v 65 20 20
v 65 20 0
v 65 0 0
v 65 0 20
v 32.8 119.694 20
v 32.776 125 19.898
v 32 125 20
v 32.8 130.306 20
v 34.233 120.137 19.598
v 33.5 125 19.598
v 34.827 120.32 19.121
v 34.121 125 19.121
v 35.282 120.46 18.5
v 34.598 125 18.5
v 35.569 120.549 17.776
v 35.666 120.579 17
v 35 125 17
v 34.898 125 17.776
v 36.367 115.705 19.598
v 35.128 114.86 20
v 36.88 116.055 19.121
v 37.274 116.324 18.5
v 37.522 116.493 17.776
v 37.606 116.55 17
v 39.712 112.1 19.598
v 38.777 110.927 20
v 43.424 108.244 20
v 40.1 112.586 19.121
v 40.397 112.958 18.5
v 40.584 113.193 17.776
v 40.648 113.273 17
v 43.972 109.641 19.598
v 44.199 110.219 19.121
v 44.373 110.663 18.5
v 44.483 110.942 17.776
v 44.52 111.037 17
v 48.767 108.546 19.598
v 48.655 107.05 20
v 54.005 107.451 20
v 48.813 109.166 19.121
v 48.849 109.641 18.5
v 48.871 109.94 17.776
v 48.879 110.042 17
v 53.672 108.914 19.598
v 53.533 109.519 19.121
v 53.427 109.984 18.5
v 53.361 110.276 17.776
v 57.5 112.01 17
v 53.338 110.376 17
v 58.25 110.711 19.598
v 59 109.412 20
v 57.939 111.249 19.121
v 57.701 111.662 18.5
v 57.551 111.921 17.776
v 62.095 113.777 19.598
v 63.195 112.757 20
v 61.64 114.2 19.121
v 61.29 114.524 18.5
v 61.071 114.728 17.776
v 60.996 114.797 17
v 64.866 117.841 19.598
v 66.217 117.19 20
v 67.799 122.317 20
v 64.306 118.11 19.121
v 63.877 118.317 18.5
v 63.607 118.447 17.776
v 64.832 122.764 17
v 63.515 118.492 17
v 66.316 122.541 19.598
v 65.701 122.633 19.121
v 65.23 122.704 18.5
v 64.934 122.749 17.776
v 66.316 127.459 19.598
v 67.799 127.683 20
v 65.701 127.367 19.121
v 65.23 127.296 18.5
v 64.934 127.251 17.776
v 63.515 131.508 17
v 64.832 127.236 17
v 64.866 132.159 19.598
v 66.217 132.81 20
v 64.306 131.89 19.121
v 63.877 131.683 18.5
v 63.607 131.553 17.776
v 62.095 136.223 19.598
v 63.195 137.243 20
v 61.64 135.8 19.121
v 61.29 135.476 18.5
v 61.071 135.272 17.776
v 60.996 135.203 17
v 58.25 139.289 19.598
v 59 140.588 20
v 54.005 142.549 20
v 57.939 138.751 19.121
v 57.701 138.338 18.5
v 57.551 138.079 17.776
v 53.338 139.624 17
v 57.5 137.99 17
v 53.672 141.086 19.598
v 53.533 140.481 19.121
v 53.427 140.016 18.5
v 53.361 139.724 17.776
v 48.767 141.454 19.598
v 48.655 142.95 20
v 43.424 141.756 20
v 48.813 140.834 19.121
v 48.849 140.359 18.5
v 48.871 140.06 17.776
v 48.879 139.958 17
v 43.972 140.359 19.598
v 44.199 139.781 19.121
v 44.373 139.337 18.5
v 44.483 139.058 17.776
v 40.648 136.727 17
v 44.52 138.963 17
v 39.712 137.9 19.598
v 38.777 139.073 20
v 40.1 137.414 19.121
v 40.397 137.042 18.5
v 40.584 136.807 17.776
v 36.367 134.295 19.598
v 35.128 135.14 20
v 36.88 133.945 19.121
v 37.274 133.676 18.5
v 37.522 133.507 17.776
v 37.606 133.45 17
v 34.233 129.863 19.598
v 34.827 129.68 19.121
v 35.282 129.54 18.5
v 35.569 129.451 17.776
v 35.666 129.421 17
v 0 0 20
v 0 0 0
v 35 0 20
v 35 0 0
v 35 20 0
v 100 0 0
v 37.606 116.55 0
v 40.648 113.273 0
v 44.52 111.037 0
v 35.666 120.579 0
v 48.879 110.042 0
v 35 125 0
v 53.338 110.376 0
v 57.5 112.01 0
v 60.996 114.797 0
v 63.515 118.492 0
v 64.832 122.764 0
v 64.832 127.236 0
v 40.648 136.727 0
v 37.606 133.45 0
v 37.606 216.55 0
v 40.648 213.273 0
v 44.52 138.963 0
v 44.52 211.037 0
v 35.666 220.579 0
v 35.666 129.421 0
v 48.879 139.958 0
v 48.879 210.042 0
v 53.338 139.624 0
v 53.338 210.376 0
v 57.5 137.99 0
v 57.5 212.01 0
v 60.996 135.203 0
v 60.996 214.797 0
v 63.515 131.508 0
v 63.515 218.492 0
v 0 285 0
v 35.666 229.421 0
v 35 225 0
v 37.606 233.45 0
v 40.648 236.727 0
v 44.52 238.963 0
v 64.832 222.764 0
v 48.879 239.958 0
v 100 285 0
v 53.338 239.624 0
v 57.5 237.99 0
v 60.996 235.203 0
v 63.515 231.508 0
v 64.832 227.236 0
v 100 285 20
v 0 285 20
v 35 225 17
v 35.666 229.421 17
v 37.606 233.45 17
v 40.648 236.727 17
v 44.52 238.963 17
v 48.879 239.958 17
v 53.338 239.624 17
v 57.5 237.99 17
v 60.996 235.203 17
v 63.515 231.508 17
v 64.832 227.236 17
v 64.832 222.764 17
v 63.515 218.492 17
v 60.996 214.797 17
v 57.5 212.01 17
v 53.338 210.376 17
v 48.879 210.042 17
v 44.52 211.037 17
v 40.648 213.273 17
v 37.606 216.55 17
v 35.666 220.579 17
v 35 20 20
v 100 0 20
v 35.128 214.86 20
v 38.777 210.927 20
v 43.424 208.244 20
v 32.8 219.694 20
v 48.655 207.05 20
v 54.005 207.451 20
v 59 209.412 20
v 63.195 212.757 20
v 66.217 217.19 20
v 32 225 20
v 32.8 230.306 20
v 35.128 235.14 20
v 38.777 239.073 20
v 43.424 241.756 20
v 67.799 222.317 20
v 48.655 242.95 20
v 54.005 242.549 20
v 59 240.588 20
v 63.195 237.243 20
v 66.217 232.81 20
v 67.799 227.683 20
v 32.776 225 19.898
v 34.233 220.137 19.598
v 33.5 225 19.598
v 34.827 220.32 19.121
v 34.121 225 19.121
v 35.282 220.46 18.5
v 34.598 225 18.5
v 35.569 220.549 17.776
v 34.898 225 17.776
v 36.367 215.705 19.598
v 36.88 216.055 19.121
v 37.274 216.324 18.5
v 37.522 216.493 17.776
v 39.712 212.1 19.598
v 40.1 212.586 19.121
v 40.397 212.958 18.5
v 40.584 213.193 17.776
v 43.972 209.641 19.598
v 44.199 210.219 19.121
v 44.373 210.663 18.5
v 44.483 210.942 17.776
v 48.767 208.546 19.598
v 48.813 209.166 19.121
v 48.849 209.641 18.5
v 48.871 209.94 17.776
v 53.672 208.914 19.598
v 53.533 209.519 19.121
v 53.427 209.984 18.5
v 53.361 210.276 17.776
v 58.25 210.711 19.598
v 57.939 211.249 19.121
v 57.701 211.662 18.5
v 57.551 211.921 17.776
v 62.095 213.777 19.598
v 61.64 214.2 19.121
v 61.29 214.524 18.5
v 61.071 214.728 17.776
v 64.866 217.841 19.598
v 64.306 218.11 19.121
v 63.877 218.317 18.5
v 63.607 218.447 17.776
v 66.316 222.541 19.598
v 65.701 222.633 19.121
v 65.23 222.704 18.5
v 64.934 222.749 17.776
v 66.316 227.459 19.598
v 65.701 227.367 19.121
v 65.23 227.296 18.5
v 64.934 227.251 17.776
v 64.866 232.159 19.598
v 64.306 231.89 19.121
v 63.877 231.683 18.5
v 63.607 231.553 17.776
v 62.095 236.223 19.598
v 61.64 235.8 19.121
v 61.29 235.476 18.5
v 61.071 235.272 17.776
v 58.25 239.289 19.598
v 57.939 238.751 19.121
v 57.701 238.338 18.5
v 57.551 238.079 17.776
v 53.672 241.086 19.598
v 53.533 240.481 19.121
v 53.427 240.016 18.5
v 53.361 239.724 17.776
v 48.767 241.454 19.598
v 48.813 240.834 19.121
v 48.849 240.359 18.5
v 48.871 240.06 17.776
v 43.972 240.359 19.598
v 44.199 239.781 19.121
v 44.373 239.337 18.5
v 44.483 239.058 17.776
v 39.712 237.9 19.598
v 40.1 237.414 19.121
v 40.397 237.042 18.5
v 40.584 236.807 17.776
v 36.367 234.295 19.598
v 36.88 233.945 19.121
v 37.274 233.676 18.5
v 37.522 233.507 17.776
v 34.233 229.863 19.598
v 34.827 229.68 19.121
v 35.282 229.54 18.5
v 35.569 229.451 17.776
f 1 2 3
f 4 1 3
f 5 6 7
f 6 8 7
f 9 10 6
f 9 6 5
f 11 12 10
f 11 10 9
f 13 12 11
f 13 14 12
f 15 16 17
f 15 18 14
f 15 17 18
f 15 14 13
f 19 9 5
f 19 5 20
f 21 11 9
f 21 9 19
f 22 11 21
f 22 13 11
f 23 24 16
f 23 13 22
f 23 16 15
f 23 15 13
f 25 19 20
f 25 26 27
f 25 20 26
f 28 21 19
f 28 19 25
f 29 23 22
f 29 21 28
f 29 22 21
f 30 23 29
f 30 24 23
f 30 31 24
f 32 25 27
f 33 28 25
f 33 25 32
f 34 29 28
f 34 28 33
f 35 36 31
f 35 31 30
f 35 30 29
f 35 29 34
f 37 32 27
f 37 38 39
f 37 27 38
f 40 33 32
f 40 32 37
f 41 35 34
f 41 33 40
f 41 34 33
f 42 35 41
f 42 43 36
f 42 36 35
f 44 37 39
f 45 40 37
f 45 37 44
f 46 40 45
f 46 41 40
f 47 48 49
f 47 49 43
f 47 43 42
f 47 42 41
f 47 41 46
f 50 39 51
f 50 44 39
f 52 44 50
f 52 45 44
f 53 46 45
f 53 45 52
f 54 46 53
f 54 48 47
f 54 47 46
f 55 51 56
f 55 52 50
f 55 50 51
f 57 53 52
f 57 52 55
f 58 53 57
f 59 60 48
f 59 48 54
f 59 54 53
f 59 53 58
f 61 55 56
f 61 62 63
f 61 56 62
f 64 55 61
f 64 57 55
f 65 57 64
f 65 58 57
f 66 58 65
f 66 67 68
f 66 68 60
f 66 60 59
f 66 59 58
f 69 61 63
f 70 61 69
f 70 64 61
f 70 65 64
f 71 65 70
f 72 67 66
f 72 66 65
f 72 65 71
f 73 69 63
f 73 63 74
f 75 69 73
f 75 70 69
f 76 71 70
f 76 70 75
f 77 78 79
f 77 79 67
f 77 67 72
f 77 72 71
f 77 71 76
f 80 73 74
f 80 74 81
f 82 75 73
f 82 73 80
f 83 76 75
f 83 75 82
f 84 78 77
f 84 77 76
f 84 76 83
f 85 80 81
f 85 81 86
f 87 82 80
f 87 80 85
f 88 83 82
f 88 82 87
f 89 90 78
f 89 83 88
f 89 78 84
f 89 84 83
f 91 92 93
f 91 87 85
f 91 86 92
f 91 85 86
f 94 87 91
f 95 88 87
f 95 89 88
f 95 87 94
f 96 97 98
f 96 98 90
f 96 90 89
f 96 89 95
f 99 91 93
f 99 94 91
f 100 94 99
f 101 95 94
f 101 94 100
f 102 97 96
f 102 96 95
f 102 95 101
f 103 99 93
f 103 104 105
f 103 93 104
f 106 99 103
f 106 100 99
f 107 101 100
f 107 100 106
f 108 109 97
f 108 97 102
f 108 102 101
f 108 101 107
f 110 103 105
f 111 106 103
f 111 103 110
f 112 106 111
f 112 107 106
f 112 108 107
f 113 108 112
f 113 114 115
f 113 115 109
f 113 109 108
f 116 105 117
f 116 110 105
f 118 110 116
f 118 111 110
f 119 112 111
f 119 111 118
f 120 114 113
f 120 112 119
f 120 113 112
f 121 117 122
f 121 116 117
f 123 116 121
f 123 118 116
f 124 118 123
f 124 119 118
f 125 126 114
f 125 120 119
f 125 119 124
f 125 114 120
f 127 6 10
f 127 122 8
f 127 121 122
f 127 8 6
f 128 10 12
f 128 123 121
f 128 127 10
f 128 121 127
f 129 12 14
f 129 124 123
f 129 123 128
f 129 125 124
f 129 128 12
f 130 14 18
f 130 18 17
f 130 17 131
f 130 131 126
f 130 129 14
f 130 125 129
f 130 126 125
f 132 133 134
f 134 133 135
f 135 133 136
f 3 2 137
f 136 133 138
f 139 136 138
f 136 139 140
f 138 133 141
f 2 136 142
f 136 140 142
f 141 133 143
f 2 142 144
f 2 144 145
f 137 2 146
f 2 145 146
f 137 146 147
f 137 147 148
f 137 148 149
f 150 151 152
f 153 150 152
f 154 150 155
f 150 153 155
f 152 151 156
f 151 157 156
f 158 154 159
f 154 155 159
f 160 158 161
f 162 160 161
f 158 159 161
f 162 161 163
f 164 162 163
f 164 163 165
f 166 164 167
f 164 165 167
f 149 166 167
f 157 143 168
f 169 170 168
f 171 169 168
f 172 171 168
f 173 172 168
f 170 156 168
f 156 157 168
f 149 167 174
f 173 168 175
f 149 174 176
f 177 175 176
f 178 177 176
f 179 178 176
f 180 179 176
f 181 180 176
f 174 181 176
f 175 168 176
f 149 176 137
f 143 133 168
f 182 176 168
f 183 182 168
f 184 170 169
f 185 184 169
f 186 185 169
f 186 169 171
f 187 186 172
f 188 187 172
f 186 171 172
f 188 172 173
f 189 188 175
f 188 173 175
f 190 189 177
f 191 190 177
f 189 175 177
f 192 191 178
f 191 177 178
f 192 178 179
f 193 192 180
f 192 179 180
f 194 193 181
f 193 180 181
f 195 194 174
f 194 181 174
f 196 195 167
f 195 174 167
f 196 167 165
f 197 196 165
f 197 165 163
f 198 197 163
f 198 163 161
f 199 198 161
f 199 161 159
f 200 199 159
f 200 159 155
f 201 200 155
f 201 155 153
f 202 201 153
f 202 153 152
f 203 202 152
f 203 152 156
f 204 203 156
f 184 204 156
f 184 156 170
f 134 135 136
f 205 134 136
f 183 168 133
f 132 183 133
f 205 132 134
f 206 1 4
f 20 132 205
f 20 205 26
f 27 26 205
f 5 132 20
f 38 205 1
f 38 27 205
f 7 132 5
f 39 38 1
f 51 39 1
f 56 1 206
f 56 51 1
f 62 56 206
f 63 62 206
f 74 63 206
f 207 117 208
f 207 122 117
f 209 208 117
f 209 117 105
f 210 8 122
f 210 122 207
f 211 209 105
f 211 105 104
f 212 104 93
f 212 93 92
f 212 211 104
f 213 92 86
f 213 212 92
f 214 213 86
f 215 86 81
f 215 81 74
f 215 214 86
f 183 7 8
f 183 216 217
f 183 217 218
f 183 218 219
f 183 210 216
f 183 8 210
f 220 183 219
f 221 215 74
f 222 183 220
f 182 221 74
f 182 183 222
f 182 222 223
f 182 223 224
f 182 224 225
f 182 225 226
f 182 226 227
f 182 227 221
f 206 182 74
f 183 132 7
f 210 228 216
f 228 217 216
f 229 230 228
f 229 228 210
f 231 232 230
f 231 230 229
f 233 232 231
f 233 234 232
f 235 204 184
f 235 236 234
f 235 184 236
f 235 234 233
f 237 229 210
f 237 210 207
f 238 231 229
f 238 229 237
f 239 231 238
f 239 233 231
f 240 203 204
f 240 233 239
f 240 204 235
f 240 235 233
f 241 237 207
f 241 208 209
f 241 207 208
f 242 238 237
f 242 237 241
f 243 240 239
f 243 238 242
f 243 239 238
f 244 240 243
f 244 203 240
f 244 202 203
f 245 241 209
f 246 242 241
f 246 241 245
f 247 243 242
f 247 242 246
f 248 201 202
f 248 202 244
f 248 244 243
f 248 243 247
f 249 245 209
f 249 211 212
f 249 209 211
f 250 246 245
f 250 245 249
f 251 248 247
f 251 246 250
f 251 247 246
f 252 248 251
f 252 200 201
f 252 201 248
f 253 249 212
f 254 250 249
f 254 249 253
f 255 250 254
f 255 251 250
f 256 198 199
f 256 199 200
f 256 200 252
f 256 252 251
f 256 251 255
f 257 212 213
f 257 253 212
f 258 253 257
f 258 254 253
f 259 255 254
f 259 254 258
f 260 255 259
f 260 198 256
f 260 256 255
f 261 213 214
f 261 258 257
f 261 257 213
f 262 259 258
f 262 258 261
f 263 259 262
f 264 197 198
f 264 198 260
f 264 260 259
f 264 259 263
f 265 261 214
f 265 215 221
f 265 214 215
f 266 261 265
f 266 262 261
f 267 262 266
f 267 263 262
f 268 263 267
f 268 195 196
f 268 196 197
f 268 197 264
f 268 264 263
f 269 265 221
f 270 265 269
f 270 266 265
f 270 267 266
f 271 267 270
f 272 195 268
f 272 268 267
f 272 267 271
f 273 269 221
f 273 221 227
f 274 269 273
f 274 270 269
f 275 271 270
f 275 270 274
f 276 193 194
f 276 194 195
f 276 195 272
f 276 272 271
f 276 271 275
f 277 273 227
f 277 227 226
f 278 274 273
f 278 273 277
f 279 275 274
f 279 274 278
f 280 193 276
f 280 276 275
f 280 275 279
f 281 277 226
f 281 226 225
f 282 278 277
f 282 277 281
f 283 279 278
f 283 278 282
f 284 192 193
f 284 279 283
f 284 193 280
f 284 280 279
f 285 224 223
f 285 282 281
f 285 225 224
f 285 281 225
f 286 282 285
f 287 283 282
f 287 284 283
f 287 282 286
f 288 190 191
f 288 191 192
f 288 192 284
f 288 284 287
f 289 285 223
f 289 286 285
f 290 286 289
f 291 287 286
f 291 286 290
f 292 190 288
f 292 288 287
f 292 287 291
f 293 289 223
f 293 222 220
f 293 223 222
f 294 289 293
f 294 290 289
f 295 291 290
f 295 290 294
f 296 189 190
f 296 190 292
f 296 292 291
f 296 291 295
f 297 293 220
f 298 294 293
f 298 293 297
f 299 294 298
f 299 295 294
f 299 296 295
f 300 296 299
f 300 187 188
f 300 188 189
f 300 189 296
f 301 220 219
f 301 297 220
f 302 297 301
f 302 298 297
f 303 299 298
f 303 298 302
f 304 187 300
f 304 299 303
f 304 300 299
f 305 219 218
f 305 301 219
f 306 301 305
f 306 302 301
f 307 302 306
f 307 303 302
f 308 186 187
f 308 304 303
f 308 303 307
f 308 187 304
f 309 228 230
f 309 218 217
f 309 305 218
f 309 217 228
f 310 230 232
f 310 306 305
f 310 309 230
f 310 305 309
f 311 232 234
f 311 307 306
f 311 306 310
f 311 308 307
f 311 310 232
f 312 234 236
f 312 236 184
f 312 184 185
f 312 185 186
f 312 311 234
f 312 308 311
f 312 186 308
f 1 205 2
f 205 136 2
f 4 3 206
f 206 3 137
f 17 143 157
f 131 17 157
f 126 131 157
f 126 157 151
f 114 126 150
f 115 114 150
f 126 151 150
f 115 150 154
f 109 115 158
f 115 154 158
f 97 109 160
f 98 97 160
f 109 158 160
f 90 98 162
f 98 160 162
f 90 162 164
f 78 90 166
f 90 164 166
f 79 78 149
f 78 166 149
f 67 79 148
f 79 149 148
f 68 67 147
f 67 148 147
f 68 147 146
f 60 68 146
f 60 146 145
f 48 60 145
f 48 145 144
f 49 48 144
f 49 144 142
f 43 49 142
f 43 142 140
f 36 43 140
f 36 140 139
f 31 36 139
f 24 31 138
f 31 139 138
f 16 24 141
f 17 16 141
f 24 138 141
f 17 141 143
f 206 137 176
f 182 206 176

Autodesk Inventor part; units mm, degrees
ref_plane "YZ Plane" through (0, 0, 0) normal (1, 0, 0) x (0, 1, 0)
ref_plane "XZ Plane" through (0, 0, 0) normal (0, 1, 0) x (-1, 0, 0)
ref_plane "XY Plane" through (0, 0, 0) normal (0, 0, 1) x (1, 0, 0)
sketch "Sketch1" plane through (0, 0, 0) normal (0, 0, 1) x (1, 0, 0)
  line L0 (0, 0) -> (100, 0)
  line L1 (100, 0) -> (100, 285)
  line L2 (100, 285) -> (0, 285)
  line L3 (0, 285) -> (0, 0)
  dimension "d0" = 100
  dimension "d1" = 285
extrude "Extrusion1" add sketch "Sketch1" along normal blind 20
sketch "Sketch2" plane through (0, 0, 0) normal (0, 0, -1) x (-1, 0, 0)
  circle A0 centre (-50, 125) radius 15
  circle A1 centre (-50, 225) radius 15
  line L0 (0, 285) -> (0, 0) projected
  line L1 (0, 0) -> (-100, 0) projected
  line L2 (-100, 285) -> (0, 285) projected
  dimension "d5" = 30
  dimension "d6" = 50
  dimension "d7" = 50
  dimension "d9" = 100
  dimension "d17" = 60
extrude "Extrusion2" cut sketch "Sketch2" against normal up to next
sketch "Sketch3" plane through (0, 0, 0) normal (0, 0, -1) x (-1, 0, 0)
  line L0 (0, 0) -> (-100, 0) projected
  line L1 (-35, 0) -> (-35, 20)
  line L2 (-35, 20) -> (-65, 20)
  line L3 (-65, 20) -> (-65, 0)
  line L4 (0, 285) -> (0, 0) projected
  dimension "d12" = 20
  dimension "d13" = 30
  dimension "d14" = 35
extrude "Extrusion3" cut sketch "Sketch3" against normal up to next
sketch "Sketch4" plane through (0, 0, 0) normal (-1, 0, 0) x (0, 0, 1)
  line L0 (0, 285) -> (0, 0) projected
  line L1 (0, 0) -> (20, 0) projected
  line L2 (20, 285) -> (20, 0) projected
  line L3 (0, 285) -> (20, 285) projected
  line L4 (20, 285) -> (90.7107, 214.2893) construction
  line L5 (20, 285) -> (120, 285) construction
  dimension "d18" = 100
  dimension "d19" = 45
fillet "Fillet3" radius 3 2 edges at (65, 125, 20) (65, 225, 20)
properties part number "EndaHaldarar" material "Wood (Birch)"
